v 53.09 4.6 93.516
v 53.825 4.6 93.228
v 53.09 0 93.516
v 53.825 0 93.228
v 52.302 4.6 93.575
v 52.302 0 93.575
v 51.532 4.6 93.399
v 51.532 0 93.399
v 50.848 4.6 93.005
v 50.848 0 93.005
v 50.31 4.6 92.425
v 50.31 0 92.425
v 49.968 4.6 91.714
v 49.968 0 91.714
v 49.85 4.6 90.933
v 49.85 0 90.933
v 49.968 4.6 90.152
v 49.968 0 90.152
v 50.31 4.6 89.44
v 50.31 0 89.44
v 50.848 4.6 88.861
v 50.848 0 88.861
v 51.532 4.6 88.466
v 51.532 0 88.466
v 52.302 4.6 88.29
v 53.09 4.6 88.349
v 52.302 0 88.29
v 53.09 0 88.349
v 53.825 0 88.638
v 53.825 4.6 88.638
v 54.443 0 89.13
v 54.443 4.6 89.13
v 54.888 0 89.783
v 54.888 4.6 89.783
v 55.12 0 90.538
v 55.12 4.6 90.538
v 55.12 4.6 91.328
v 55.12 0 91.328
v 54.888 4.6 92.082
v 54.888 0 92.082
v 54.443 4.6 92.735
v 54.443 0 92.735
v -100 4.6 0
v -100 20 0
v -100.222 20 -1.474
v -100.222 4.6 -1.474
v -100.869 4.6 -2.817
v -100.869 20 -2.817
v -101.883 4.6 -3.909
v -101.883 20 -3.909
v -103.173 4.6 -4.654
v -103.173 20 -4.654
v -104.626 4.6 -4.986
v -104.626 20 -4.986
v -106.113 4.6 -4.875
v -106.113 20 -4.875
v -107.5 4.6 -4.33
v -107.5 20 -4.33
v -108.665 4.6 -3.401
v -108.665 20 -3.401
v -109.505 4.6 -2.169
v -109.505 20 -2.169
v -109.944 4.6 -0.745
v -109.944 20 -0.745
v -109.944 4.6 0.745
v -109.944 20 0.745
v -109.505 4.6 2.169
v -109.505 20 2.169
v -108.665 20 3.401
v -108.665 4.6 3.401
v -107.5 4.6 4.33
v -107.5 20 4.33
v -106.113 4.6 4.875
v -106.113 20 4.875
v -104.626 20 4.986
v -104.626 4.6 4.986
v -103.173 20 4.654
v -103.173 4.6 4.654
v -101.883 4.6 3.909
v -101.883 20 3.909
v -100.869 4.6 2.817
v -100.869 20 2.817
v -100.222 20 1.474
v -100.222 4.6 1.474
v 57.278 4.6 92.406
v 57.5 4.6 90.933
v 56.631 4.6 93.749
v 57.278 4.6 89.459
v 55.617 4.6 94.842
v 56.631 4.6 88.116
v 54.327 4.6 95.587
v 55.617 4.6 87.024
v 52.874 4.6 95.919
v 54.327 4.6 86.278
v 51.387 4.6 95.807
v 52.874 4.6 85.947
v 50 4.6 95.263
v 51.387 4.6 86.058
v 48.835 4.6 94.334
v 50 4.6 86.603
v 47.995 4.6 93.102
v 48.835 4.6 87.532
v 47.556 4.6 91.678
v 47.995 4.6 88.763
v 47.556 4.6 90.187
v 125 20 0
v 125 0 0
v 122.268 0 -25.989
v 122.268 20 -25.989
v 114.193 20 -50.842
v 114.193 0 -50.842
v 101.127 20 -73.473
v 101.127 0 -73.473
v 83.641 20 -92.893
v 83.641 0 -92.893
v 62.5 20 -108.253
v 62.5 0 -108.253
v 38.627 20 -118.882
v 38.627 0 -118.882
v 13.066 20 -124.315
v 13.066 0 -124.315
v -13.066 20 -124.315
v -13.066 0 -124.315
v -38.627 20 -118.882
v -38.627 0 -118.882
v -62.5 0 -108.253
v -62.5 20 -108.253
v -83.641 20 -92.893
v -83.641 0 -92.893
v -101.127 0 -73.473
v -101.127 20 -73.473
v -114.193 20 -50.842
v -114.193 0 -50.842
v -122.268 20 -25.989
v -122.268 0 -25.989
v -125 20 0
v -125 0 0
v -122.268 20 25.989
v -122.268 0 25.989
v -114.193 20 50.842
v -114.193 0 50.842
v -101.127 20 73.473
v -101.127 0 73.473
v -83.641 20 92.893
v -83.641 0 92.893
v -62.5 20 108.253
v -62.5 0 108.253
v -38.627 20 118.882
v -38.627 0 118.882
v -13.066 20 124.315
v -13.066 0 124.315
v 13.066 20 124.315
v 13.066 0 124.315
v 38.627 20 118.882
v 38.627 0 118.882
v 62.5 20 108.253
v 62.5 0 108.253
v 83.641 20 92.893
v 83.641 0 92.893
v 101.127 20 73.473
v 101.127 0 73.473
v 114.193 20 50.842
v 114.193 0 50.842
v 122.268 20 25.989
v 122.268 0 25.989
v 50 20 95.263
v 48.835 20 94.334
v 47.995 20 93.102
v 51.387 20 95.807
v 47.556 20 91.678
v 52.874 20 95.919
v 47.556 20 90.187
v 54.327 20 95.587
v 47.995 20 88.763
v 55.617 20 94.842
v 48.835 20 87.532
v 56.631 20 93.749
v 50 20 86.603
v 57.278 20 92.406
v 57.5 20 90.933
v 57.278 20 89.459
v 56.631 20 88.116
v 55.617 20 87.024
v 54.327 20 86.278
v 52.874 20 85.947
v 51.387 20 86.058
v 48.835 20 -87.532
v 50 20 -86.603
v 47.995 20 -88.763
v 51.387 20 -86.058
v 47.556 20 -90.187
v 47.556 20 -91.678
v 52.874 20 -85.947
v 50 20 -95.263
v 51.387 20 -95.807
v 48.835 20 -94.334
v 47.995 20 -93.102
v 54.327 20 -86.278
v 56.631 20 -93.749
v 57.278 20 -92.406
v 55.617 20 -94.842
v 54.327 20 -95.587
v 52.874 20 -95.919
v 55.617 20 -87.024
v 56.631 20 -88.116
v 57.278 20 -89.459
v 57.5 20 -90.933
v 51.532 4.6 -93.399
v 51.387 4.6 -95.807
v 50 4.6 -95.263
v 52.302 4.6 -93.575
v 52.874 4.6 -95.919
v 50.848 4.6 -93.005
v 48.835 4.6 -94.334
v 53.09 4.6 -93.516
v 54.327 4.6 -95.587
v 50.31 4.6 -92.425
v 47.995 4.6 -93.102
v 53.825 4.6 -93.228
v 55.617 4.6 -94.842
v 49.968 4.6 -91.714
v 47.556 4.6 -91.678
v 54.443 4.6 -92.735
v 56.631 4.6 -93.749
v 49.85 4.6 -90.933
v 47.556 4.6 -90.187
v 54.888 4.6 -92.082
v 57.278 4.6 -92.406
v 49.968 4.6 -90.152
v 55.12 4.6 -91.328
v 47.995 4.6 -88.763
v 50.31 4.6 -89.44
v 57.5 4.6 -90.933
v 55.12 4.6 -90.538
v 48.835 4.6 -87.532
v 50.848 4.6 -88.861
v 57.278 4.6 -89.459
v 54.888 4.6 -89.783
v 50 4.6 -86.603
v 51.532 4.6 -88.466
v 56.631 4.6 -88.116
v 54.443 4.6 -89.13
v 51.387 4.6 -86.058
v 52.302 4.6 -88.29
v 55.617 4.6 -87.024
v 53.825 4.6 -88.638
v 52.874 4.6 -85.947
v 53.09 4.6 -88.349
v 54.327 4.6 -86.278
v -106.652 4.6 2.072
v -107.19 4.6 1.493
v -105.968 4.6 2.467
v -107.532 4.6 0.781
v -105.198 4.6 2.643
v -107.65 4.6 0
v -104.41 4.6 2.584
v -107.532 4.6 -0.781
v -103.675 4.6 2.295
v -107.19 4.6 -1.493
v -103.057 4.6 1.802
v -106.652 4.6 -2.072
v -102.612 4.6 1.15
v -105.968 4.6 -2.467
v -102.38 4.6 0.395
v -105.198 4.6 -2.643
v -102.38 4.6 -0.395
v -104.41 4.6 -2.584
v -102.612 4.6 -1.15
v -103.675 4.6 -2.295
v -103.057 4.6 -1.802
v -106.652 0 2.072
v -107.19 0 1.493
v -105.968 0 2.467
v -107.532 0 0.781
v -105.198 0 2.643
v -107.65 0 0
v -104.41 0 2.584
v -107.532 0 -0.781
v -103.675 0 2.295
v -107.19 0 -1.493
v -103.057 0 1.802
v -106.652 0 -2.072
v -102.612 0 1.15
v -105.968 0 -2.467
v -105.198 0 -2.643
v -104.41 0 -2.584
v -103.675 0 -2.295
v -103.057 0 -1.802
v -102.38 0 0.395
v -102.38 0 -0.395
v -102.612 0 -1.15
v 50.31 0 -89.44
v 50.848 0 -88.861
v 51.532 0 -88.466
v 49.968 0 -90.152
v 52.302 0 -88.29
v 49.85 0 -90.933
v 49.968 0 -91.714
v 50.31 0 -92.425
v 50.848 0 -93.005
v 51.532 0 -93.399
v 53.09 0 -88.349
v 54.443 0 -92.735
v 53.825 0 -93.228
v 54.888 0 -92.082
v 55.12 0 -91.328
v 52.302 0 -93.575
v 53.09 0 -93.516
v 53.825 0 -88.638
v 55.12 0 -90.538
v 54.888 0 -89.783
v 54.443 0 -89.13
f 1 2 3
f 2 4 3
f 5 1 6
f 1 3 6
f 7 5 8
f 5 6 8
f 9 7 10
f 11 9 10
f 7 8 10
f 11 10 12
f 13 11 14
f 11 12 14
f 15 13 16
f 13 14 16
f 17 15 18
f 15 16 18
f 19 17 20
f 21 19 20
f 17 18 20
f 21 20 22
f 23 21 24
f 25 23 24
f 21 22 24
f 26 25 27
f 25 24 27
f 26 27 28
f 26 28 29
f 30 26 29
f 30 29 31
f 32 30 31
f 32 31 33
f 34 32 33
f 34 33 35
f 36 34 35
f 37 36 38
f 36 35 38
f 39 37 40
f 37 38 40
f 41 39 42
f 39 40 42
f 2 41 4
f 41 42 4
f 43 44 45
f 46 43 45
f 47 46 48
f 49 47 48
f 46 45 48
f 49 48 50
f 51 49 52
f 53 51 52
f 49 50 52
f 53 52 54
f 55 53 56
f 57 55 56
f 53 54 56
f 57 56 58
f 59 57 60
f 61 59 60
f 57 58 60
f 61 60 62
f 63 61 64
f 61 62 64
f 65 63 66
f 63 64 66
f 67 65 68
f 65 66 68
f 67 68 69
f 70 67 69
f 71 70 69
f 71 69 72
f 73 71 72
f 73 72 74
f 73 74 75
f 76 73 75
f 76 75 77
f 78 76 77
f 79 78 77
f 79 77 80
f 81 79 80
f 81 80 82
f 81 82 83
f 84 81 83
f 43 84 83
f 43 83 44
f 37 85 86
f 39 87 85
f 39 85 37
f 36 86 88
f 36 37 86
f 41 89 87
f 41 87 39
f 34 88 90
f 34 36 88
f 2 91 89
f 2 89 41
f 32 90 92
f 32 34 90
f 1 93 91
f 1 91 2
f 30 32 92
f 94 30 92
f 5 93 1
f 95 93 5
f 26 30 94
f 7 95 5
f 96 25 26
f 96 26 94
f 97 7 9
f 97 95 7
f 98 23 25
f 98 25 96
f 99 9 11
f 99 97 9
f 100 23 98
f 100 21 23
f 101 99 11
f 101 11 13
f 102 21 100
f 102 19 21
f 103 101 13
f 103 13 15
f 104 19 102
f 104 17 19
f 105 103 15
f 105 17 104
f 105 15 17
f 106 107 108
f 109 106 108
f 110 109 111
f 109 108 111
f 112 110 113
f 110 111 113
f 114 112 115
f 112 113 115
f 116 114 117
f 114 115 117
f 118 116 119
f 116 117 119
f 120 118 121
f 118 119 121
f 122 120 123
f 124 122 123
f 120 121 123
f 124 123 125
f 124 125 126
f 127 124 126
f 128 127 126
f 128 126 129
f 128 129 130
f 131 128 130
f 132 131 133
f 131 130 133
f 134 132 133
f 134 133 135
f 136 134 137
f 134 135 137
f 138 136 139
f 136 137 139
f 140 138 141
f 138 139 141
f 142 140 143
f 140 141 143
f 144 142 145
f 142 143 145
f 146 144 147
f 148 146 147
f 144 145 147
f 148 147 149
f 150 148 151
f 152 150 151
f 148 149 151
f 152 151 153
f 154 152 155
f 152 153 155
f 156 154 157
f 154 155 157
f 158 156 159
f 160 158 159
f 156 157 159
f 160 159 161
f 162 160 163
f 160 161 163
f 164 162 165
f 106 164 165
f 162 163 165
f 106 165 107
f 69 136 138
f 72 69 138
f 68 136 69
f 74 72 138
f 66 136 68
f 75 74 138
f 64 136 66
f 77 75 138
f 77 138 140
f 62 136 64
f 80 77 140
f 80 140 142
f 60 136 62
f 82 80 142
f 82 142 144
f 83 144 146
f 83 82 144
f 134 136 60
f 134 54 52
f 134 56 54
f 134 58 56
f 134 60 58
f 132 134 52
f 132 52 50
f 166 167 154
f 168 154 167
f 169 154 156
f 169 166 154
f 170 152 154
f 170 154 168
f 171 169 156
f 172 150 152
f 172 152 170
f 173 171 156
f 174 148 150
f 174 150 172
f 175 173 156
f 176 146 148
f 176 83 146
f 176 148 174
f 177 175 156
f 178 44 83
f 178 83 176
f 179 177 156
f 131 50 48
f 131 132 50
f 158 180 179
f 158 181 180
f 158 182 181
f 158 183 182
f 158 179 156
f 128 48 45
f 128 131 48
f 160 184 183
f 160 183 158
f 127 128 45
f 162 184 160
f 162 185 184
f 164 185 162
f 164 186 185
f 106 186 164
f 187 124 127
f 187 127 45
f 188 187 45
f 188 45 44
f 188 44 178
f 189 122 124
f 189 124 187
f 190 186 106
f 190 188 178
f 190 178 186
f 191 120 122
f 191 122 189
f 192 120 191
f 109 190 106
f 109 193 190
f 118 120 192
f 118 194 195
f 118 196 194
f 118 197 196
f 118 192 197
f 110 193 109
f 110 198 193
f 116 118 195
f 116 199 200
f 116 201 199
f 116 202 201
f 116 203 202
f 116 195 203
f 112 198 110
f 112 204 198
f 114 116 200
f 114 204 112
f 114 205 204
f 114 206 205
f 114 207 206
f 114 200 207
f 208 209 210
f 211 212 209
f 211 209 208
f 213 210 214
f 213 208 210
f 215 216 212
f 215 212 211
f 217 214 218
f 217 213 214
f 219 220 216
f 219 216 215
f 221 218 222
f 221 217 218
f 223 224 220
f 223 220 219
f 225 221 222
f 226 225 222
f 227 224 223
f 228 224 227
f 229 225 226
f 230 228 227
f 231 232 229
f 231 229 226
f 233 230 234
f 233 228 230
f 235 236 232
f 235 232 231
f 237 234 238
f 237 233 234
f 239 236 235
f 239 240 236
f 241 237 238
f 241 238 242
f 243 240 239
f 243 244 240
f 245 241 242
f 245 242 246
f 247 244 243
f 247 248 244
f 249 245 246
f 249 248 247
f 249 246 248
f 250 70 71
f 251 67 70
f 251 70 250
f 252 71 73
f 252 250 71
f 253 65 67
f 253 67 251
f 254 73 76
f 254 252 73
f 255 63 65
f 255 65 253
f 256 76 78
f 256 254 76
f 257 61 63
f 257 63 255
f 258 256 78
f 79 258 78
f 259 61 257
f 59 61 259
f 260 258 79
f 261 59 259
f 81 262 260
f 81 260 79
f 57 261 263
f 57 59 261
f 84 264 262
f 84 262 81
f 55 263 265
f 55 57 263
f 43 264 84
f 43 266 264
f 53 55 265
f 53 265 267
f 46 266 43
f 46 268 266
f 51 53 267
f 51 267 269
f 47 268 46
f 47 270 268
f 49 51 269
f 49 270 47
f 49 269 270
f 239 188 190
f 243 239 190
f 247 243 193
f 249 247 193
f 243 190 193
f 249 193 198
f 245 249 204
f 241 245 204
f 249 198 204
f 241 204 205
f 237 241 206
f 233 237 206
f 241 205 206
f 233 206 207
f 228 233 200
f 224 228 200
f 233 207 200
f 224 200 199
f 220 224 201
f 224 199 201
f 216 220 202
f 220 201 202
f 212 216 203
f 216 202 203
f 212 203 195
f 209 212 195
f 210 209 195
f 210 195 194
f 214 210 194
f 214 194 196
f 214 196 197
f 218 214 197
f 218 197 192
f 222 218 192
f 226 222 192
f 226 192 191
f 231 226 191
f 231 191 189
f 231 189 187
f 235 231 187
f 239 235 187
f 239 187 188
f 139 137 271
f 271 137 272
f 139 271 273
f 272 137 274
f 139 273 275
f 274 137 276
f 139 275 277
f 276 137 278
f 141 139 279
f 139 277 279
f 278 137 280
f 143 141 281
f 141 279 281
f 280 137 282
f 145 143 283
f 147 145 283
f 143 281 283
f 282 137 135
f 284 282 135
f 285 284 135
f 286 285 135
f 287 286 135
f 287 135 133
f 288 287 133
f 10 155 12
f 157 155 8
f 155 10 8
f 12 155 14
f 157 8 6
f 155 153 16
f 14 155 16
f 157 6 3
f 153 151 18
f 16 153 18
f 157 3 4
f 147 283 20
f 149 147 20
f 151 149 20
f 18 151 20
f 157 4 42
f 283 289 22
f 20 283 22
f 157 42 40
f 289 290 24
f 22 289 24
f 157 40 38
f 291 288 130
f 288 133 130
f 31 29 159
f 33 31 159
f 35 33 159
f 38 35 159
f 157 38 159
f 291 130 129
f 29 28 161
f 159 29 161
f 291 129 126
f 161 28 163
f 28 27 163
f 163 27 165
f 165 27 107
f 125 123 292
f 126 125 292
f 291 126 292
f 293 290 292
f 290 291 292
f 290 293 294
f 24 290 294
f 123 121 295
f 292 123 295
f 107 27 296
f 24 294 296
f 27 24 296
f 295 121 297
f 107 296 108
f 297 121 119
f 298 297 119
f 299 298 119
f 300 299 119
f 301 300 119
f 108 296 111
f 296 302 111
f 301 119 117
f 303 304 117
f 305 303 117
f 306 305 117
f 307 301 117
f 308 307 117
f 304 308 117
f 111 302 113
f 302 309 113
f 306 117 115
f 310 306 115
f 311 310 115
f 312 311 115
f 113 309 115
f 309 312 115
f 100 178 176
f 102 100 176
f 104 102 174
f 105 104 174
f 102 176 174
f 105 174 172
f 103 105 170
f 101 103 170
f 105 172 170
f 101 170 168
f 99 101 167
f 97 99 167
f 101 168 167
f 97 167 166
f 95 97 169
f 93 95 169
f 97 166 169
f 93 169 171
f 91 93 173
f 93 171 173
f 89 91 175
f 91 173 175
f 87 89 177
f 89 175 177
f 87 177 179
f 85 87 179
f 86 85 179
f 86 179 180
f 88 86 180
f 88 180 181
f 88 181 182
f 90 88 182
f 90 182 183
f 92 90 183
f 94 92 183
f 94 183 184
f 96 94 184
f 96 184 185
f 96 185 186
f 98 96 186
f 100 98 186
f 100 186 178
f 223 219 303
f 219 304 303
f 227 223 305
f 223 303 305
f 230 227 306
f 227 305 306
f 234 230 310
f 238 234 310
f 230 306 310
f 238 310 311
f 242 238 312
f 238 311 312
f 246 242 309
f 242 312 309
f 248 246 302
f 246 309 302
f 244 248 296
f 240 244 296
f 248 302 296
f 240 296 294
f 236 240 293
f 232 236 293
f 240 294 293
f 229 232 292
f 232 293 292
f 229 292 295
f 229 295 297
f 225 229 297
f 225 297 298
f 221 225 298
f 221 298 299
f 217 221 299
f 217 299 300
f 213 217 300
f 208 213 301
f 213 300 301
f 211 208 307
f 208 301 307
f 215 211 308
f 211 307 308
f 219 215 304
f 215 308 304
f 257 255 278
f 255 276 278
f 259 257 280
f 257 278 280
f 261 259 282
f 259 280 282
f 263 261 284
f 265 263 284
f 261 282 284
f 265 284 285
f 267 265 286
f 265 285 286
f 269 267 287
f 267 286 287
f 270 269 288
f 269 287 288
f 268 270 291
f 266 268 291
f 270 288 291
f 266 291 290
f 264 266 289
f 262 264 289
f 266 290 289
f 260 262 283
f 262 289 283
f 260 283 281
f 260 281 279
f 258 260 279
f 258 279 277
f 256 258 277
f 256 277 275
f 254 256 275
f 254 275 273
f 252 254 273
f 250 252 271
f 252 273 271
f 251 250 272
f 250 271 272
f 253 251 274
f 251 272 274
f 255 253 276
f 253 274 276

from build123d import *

# Parameters (mm, degrees)
SKETCH1_R                                           = 125
PLATE_DEPTH                                         = 20
CBORE_FOR_M5_HEX_SOCKET_HEAD_CAP_SCREW1_D           = 5.3
CBORE_FOR_M5_HEX_SOCKET_HEAD_CAP_SCREW1_CBORE_D     = 10
CBORE_FOR_M5_HEX_SOCKET_HEAD_CAP_SCREW1_CBORE_DEPTH = 15.4
CIRPATTERN1_COUNT                                   = 3


with BuildPart() as part:
    # Sketch1 → Plate (new body)
    with BuildSketch(Plane(origin=(0, 0, 0), x_dir=(1, 0, 0), z_dir=(0, 1, 0))):
        Circle(SKETCH1_R)
    extrude(amount=PLATE_DEPTH)

    # CBORE for M5 Hex Socket Head Cap Screw1 (through all)
    with Locations(Plane(origin=(0, 20, 0), x_dir=(1, 0, 0), z_dir=(0, 1, 0))):
        with Locations((-105, 0)):
            cbore_for_m5_hex_socket_head_cap_screw1 = CounterBoreHole(CBORE_FOR_M5_HEX_SOCKET_HEAD_CAP_SCREW1_D / 2, CBORE_FOR_M5_HEX_SOCKET_HEAD_CAP_SCREW1_CBORE_D / 2, CBORE_FOR_M5_HEX_SOCKET_HEAD_CAP_SCREW1_CBORE_DEPTH)

    # CirPattern1: CBORE for M5 Hex Socket Head Cap Screw1 ×3 about axis
    cirpattern1_axis = Axis((0, 0, 0), (0, 1, 0))
    for i in range(1, CIRPATTERN1_COUNT):
        add(cbore_for_m5_hex_socket_head_cap_screw1.rotate(cirpattern1_axis, i * 360 / CIRPATTERN1_COUNT), mode=Mode.SUBTRACT)


solid = part.part
